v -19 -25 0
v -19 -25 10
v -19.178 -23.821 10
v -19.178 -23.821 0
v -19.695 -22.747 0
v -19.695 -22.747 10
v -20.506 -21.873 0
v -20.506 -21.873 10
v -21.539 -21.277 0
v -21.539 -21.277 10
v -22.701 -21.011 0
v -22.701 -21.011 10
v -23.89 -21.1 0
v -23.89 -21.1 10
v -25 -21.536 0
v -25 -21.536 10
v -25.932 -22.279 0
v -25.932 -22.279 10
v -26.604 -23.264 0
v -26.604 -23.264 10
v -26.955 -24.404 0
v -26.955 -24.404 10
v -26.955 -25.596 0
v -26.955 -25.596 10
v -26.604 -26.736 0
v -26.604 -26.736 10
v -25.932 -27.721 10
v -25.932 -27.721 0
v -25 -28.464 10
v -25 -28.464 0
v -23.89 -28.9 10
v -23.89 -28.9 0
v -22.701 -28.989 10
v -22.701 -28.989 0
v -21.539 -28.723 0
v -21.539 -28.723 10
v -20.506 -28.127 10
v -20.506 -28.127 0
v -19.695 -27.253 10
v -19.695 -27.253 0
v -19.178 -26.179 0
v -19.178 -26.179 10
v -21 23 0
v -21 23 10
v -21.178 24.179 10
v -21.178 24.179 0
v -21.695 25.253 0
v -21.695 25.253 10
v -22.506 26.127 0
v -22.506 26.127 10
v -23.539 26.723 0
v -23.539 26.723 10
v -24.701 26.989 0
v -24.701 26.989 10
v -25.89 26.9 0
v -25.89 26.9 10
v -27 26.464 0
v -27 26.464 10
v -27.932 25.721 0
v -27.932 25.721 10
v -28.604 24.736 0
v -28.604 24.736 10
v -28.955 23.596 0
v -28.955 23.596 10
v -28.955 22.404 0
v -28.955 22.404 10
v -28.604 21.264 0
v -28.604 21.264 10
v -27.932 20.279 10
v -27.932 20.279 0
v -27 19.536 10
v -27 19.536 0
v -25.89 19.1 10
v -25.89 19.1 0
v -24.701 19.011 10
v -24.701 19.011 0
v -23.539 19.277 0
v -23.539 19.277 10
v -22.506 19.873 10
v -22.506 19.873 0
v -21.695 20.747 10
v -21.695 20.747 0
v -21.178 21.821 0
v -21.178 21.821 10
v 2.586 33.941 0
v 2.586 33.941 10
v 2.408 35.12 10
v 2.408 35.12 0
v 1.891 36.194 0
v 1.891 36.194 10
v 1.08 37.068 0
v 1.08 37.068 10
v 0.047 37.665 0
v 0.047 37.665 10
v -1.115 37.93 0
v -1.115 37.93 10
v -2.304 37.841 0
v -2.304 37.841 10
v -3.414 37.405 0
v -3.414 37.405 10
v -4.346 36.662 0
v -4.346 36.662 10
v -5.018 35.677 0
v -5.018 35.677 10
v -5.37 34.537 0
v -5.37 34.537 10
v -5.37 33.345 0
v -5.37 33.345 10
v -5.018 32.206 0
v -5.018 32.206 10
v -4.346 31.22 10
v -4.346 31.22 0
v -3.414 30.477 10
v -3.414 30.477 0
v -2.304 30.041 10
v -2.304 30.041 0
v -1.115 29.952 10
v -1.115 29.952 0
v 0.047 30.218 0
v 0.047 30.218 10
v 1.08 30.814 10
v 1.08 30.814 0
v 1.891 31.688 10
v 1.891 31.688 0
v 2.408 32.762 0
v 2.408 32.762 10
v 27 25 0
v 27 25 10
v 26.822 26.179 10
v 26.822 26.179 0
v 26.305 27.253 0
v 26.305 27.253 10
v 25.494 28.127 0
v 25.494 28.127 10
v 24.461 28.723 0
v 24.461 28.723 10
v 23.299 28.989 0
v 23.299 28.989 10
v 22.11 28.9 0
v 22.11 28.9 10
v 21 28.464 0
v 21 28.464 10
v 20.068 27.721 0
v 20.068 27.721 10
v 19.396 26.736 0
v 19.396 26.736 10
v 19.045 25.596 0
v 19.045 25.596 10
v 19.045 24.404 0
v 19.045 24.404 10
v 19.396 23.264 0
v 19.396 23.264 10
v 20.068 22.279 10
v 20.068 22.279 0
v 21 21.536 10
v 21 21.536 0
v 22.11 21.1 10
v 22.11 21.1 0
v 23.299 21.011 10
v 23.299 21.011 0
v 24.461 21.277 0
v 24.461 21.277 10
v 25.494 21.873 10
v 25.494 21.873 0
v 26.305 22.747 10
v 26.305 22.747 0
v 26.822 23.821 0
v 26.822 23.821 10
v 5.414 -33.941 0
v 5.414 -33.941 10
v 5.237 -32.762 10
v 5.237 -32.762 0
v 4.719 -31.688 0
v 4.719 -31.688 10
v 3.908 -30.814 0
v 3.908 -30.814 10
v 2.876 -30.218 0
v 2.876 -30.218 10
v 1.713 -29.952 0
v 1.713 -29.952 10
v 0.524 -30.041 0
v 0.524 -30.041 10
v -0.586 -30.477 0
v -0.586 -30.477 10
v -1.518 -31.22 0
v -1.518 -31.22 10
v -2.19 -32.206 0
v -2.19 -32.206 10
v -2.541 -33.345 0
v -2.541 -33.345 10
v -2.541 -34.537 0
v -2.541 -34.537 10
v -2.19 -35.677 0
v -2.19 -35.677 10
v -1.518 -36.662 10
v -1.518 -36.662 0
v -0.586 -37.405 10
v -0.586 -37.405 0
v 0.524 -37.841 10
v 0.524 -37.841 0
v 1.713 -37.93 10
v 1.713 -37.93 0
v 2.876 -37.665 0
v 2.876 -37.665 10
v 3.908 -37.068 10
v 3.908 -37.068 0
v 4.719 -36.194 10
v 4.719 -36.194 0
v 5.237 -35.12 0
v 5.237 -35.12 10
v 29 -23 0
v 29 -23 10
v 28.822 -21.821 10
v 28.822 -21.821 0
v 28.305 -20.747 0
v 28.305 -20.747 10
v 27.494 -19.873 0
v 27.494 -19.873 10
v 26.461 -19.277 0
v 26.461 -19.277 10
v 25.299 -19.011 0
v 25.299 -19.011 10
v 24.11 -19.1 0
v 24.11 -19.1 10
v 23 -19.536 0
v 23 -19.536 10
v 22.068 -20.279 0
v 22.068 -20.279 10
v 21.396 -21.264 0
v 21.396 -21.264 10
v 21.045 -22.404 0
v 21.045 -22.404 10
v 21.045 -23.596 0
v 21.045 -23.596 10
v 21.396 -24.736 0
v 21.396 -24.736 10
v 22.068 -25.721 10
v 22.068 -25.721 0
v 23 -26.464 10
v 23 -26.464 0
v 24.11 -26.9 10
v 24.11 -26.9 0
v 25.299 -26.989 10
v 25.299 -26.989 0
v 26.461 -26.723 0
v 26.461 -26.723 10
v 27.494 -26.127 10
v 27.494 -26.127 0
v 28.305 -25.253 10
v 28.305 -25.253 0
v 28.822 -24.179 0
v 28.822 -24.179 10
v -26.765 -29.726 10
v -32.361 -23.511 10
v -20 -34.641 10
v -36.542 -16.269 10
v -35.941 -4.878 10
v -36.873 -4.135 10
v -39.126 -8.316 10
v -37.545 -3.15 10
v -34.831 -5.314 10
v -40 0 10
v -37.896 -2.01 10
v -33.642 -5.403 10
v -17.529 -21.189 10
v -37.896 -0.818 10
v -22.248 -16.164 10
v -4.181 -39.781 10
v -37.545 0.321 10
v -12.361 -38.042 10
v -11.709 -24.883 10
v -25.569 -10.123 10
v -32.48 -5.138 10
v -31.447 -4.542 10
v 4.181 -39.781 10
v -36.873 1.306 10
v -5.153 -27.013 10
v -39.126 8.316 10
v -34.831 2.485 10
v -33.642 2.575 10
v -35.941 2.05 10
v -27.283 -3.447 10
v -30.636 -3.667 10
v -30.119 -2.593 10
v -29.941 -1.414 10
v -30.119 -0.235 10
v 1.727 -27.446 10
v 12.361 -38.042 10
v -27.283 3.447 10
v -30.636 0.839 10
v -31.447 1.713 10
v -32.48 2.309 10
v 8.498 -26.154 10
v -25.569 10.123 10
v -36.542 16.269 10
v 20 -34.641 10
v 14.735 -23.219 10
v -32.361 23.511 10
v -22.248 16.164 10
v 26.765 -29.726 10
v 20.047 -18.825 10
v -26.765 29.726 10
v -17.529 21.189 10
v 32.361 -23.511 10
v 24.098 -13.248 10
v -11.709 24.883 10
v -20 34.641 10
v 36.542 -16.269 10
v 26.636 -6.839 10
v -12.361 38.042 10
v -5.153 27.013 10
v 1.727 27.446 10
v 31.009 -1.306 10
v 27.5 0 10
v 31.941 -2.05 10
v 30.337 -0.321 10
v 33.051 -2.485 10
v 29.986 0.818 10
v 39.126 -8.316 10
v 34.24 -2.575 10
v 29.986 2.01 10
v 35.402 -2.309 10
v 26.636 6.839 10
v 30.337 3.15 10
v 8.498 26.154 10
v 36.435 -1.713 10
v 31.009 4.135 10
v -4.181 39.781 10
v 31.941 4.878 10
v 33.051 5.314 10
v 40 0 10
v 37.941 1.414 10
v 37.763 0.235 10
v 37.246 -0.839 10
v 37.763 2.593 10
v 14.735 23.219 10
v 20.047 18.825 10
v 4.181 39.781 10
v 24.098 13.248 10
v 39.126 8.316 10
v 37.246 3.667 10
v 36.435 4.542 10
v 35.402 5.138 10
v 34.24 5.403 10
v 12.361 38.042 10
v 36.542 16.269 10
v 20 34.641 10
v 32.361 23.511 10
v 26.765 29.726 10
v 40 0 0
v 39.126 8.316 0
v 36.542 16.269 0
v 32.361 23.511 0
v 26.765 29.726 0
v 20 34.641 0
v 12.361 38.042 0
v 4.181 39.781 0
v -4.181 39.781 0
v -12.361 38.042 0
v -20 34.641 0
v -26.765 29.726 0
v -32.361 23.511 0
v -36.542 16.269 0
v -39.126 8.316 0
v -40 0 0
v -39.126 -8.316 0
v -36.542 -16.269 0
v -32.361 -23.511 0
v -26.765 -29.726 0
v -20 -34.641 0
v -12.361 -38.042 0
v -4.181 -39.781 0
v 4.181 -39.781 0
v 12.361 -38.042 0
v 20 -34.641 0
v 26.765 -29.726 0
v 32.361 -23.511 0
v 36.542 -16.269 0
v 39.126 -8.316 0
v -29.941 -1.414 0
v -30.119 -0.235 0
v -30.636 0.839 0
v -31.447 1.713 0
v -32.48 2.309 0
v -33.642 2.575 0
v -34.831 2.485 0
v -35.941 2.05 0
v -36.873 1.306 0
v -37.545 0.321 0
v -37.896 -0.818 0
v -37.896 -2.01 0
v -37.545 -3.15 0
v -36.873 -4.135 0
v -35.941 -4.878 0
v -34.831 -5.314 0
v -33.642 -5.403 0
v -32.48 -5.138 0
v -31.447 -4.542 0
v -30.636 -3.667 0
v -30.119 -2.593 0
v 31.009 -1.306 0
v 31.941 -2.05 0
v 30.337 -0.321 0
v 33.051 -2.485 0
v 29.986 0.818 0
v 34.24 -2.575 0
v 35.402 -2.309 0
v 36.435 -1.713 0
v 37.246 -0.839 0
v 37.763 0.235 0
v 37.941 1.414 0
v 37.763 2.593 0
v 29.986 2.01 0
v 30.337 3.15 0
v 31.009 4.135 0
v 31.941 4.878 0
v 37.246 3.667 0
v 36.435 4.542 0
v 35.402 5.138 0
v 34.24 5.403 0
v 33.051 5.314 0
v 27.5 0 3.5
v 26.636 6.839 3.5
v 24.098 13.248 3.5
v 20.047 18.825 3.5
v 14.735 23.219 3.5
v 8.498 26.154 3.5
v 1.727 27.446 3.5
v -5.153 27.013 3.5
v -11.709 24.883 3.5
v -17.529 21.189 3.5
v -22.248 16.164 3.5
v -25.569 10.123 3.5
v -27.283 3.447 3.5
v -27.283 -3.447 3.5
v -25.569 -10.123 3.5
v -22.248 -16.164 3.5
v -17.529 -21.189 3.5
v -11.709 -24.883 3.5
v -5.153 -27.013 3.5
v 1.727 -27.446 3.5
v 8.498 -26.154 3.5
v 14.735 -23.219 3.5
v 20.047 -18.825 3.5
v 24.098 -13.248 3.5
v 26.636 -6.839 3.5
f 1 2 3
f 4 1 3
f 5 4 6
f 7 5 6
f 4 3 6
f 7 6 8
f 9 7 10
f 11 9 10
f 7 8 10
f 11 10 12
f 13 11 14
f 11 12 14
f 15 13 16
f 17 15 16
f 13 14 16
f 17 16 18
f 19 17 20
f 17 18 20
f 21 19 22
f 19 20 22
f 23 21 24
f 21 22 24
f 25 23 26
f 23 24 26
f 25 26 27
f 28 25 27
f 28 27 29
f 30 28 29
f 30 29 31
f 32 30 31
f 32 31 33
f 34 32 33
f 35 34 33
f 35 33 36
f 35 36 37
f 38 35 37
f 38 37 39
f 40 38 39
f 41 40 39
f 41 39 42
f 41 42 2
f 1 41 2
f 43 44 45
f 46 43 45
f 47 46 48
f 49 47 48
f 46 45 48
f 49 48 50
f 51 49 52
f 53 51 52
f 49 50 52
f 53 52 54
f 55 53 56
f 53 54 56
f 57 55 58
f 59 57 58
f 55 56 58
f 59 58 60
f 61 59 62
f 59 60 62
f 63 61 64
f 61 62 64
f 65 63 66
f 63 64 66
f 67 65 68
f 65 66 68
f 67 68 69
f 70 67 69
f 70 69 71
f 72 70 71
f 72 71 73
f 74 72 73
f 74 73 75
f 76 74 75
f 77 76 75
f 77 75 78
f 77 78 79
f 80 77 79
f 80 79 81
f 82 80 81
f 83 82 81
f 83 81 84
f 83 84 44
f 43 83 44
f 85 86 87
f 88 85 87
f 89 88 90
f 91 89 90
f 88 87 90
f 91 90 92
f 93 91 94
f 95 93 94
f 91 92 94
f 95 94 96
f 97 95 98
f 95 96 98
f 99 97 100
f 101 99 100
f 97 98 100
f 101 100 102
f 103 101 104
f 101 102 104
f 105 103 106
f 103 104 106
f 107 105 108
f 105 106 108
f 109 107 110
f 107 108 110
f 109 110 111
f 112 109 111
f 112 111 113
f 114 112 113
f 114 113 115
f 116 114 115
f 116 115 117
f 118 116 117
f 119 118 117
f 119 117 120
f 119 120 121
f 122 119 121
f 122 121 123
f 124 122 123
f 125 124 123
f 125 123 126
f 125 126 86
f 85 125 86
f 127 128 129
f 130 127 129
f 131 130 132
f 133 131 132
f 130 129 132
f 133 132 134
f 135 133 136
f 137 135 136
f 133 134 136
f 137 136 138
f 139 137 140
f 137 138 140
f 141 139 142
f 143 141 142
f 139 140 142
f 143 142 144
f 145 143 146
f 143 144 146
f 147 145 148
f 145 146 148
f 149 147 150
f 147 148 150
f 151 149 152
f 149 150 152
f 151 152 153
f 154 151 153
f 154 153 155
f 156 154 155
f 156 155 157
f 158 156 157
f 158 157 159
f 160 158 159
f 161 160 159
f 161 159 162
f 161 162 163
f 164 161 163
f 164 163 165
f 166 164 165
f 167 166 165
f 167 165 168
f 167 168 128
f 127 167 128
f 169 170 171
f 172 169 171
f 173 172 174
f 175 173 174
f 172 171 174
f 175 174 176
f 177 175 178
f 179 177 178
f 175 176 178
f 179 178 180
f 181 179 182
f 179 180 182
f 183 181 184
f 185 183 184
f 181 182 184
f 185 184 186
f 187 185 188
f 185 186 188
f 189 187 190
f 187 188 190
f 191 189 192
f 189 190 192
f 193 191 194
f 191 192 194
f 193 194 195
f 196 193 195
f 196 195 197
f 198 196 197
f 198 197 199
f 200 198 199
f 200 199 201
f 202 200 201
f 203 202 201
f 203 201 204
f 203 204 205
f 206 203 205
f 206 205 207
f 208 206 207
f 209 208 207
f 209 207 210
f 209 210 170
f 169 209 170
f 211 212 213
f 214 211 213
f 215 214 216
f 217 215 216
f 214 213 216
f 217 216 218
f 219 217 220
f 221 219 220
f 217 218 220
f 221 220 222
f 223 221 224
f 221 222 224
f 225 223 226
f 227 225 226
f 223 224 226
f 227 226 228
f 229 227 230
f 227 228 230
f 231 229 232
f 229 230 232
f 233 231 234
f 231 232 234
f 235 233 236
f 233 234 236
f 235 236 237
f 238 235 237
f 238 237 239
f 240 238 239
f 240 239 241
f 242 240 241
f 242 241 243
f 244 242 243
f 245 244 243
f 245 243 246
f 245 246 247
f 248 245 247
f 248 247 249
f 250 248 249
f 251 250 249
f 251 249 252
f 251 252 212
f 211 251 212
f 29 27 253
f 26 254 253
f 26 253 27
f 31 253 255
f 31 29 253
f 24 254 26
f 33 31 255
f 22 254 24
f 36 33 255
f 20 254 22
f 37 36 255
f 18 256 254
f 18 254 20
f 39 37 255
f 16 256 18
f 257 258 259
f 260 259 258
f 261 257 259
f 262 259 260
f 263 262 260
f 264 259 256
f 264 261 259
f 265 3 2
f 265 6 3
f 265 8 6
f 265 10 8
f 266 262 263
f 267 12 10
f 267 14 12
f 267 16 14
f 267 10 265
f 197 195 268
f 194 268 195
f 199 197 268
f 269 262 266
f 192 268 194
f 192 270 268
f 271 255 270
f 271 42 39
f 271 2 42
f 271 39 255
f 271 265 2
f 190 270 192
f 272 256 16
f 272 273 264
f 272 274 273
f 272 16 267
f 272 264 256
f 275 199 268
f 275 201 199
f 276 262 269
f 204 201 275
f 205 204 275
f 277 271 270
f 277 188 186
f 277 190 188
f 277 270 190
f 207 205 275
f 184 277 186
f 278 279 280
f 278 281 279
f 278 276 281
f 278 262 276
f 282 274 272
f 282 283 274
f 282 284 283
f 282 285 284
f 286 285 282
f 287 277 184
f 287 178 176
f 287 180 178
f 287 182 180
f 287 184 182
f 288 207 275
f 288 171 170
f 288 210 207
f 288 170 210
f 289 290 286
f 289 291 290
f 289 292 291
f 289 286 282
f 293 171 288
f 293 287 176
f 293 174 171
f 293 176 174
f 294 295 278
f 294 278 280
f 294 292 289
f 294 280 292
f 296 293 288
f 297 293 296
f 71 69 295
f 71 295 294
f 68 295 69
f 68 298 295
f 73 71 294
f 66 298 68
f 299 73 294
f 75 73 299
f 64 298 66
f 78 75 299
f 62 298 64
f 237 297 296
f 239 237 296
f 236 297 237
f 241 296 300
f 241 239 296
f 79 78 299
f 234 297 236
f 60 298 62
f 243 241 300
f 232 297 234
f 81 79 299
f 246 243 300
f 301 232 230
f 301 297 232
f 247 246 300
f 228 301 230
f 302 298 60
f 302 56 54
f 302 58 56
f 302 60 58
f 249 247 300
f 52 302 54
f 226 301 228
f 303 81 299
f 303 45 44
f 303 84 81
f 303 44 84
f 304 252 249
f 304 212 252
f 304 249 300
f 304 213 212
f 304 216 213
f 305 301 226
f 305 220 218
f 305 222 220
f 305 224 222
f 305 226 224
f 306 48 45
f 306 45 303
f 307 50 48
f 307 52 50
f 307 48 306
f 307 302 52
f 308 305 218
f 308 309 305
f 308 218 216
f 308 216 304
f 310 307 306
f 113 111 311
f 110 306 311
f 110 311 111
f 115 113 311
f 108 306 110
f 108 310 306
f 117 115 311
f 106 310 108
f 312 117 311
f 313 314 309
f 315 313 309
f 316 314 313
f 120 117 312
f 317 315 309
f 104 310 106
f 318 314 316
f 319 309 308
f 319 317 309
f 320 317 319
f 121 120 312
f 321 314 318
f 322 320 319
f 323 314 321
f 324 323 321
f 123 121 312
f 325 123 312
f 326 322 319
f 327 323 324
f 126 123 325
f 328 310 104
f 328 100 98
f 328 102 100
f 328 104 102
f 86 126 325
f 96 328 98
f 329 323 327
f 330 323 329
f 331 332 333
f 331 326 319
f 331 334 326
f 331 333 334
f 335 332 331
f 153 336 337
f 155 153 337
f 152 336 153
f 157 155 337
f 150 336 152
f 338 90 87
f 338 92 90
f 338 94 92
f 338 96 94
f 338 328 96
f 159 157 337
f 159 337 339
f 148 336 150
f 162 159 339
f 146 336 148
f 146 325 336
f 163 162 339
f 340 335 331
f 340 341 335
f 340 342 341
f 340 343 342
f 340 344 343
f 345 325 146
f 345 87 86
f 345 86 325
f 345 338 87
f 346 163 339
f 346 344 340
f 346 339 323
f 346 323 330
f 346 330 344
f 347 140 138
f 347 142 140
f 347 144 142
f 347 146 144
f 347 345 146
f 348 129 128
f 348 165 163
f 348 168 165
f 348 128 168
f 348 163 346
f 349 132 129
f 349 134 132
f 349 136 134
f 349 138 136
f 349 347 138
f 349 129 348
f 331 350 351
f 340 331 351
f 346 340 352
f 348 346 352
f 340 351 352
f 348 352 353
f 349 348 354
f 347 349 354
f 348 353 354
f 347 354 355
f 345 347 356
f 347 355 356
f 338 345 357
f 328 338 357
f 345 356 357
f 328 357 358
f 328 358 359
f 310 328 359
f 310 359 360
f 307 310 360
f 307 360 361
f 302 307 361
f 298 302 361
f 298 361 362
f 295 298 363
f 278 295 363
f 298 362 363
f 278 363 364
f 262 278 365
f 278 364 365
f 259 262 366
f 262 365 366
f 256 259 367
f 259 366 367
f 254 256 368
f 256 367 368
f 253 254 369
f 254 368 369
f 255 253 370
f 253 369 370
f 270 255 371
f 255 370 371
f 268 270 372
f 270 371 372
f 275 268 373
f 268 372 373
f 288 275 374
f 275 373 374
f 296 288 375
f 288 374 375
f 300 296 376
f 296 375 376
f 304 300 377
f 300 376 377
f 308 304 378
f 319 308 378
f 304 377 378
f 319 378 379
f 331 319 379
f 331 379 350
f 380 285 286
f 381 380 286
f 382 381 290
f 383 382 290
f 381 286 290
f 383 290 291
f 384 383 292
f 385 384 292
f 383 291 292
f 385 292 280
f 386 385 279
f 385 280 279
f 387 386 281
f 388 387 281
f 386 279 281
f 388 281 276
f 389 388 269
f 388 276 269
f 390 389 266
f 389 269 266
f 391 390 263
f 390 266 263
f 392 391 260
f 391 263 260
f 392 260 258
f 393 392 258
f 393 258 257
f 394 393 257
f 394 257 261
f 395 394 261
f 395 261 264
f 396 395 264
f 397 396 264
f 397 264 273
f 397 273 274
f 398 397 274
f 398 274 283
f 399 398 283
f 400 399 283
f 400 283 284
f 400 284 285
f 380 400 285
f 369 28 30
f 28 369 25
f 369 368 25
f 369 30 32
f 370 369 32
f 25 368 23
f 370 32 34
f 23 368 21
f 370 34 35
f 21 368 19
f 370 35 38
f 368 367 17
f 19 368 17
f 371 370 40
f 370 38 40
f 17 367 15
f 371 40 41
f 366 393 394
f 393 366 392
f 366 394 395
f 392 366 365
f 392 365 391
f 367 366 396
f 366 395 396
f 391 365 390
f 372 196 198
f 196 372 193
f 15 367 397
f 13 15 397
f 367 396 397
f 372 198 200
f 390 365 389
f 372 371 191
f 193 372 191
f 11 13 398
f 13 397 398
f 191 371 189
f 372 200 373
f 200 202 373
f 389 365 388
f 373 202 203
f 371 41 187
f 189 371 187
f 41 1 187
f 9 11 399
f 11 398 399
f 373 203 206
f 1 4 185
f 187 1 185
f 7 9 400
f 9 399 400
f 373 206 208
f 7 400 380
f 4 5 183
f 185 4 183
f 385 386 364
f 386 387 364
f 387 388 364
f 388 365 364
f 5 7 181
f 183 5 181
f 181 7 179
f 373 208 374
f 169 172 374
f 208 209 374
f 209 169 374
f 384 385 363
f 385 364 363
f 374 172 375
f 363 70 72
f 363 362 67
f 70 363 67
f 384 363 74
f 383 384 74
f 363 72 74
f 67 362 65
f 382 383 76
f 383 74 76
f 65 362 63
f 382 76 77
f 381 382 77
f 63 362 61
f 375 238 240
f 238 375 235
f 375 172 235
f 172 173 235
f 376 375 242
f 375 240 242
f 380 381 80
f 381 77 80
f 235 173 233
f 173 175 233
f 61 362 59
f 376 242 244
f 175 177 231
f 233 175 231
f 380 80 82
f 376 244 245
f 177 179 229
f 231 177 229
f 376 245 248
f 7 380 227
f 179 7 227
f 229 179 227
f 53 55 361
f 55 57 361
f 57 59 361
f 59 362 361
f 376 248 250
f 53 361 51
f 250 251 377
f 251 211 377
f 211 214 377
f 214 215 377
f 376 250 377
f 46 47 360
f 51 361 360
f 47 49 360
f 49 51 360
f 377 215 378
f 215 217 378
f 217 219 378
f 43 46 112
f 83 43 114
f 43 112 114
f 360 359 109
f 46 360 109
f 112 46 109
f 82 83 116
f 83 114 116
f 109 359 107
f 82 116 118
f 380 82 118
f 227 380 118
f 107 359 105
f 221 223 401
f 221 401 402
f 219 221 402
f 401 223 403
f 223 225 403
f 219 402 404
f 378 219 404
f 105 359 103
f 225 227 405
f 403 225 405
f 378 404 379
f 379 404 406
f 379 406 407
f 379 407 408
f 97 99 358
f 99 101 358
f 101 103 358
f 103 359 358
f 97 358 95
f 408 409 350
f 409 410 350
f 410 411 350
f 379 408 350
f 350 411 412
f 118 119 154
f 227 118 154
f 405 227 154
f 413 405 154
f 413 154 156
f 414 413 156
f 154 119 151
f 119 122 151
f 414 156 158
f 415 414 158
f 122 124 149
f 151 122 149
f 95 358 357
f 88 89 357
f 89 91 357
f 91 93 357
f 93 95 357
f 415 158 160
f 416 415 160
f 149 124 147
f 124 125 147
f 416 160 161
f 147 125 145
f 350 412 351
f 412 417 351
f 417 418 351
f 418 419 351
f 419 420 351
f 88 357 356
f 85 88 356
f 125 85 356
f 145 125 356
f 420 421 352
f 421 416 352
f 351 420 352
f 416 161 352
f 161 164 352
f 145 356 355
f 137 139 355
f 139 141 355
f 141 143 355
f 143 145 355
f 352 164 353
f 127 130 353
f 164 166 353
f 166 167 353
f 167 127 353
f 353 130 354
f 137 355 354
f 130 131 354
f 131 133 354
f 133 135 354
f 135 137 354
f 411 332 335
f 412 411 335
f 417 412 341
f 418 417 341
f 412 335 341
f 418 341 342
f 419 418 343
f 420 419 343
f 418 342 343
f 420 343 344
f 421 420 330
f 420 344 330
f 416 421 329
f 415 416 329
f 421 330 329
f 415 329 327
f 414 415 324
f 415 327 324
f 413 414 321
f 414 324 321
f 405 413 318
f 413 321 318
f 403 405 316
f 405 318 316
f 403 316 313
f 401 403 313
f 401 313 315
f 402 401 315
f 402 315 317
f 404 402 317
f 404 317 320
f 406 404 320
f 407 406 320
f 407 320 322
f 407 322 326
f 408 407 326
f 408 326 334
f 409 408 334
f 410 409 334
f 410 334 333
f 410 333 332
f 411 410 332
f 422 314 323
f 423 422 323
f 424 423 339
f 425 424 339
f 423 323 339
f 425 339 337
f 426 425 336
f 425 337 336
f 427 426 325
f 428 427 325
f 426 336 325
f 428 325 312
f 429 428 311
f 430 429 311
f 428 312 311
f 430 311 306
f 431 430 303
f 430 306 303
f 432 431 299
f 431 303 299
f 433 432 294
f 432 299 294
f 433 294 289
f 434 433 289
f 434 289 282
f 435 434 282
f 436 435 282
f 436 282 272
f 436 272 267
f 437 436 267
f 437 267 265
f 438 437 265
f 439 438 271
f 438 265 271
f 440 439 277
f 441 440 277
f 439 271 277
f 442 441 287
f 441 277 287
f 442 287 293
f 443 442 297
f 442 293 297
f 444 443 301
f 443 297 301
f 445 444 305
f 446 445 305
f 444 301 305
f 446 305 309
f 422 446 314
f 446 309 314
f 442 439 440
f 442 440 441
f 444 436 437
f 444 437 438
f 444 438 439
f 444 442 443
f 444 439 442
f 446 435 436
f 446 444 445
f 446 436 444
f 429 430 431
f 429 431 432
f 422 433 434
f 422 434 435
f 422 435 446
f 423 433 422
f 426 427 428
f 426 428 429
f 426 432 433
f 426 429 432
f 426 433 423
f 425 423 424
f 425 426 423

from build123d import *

# Parameters (mm, degrees)
SKETCH1_R           = 40
BOSS_EXTRUDE1_DEPTH = 10
SKETCH2_R           = 27.5
CUT_EXTRUDE1_DEPTH  = 6.5
SKETCH3_R           = 4
CUT_EXTRUDE2_DEPTH  = 58.445626465


with BuildPart() as part:
    # Sketch1 → Boss-Extrude1 (new body)
    with BuildSketch(Plane.XY):
        Circle(SKETCH1_R)
    extrude(amount=BOSS_EXTRUDE1_DEPTH)

    # Sketch2 → Cut-Extrude1 (cut)
    with BuildSketch(Plane.XY.offset(10)):
        Circle(SKETCH2_R)
    extrude(amount=-CUT_EXTRUDE1_DEPTH, mode=Mode.SUBTRACT)

    # Sketch3 → Cut-Extrude2 (cut, through all)
    with BuildSketch(Plane.XY.offset(10)):
        with Locations((-25, 23)):
            Circle(SKETCH3_R)
        with Locations((-1.414213562, 33.941125497)):
            Circle(SKETCH3_R)
        with Locations((23, 25)):
            Circle(SKETCH3_R)
        with Locations((33.941125497, 1.414213562)):
            Circle(SKETCH3_R)
        with Locations((25, -23)):
            Circle(SKETCH3_R)
        with Locations((1.414213562, -33.941125497)):
            Circle(SKETCH3_R)
        with Locations((-23, -25)):
            Circle(SKETCH3_R)
        with Locations((-33.941125497, -1.414213562)):
            Circle(SKETCH3_R)
    extrude(amount=-CUT_EXTRUDE2_DEPTH, mode=Mode.SUBTRACT)


solid = part.part
